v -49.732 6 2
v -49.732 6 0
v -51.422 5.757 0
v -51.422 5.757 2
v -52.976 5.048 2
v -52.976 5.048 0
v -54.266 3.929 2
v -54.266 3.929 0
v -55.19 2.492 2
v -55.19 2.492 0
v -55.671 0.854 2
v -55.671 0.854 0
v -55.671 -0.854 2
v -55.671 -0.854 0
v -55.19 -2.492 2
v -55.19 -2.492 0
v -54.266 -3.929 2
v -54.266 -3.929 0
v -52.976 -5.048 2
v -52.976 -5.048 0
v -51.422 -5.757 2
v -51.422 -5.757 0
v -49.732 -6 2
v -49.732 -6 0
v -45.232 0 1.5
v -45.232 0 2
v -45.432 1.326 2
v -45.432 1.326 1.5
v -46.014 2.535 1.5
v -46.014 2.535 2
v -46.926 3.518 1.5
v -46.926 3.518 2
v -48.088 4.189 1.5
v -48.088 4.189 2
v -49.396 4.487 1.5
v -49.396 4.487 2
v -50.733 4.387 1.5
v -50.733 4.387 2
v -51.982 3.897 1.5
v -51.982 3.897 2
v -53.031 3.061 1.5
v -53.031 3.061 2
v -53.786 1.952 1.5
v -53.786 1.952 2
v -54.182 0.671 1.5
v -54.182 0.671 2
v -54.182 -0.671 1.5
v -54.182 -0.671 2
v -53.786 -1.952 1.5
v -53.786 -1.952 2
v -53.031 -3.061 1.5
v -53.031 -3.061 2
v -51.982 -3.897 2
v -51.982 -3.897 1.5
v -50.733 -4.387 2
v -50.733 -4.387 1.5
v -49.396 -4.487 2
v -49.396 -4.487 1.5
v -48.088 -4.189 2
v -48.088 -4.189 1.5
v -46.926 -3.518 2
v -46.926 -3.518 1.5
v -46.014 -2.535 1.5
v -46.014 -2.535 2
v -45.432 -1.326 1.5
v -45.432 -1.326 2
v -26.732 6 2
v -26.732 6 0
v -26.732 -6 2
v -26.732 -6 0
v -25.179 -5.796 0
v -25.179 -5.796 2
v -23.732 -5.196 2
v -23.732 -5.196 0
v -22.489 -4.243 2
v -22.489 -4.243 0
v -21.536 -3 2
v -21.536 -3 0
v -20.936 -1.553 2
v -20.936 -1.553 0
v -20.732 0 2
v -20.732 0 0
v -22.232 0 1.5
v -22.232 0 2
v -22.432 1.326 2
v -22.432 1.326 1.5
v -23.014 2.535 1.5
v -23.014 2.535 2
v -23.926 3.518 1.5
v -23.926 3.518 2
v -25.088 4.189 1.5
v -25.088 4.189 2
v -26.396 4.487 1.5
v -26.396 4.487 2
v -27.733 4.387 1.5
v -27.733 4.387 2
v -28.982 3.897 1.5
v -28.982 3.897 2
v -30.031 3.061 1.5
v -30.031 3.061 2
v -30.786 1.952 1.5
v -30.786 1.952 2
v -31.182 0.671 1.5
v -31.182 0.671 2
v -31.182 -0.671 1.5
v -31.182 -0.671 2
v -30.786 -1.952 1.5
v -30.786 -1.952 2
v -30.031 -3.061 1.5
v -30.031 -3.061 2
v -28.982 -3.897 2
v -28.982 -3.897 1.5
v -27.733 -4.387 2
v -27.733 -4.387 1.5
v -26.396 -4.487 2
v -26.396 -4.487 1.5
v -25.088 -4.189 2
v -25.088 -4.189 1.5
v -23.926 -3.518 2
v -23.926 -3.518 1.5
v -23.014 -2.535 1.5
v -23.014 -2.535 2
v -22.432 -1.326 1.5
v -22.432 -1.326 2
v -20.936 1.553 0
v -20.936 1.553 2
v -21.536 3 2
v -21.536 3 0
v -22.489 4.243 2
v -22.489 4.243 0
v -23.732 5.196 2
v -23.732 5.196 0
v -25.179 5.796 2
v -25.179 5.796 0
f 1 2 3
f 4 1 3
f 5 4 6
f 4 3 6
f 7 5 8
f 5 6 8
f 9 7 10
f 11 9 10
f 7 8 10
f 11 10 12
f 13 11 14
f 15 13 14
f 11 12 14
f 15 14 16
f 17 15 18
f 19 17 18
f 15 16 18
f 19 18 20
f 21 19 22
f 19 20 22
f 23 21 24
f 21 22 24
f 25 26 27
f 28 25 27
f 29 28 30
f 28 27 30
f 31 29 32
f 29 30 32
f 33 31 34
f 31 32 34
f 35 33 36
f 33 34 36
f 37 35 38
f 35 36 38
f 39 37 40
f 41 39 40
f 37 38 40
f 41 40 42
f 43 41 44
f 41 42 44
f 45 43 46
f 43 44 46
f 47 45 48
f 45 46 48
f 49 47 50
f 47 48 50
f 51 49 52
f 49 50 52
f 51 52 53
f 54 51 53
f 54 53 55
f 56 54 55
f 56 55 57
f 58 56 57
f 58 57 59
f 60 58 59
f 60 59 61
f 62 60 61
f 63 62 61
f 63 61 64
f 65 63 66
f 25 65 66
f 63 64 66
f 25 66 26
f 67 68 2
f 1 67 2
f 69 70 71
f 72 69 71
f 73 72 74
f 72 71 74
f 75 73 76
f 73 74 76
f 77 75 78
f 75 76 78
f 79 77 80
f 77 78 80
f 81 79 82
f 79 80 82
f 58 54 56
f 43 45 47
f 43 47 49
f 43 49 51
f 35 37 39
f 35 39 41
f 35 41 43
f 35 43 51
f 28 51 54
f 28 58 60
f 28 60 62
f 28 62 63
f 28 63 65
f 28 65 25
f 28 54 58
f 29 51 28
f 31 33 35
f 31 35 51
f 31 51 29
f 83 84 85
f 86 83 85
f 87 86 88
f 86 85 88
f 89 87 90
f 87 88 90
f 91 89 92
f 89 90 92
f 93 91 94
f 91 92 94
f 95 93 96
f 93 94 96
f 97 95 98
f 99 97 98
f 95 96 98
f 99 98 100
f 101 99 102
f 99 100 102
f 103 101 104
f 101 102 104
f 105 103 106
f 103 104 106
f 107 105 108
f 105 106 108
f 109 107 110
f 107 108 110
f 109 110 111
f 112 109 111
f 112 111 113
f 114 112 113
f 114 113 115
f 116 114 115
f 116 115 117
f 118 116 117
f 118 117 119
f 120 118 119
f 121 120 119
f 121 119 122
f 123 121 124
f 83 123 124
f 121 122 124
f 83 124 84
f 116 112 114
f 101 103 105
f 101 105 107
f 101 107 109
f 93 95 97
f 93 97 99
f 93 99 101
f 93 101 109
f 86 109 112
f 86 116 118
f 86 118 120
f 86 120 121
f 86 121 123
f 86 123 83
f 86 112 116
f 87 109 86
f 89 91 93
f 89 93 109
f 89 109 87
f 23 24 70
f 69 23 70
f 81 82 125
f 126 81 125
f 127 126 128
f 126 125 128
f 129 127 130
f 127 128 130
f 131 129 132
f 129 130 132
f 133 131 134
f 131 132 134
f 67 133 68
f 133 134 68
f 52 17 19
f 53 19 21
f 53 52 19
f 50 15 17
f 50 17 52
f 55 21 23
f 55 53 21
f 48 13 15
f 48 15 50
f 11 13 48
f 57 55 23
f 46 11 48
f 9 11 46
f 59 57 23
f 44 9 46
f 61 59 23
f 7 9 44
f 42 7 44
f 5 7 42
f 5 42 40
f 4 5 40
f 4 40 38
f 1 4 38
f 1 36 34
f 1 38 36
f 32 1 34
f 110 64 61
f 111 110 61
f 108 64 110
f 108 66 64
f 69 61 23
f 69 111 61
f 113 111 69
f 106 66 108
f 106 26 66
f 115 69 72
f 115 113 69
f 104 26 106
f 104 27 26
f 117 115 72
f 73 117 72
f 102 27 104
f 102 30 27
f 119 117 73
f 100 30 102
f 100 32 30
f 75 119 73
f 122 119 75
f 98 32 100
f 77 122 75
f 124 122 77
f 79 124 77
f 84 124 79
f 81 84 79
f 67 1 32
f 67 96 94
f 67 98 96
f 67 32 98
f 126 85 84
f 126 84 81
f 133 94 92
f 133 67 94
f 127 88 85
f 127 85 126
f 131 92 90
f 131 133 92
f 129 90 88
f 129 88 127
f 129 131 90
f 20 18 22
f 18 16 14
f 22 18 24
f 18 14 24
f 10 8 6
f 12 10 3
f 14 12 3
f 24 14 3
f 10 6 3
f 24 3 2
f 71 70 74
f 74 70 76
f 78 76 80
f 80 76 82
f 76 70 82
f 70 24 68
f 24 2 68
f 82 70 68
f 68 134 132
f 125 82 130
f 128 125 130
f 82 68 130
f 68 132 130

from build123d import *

# Parameters (mm, degrees)
F1_DEPTH = 2
F2_R     = 4.5
F3_DEPTH = 0.5


with BuildPart() as f1:
    # F0 (on Top) → F1 (new body)
    with BuildSketch(Plane.XY):
        with BuildLine():
            ThreePointArc((-49.731933, -6), (-45.489292, -4.242641), (-43.731933, 0))
            ThreePointArc((-43.731933, 0), (-45.489292, 4.242641), (-49.731933, 6))
            ThreePointArc((-49.731933, 6), (-55.731933, 0), (-49.731933, -6))
        make_face()
        with BuildLine():
            ThreePointArc((-49.731933, 6), (-45.489292, 4.242641), (-43.731933, 0))
            ThreePointArc((-43.731933, 0), (-45.489292, -4.242641), (-49.731933, -6))
            Line((-49.731933, -6), (-26.731933, -6))
            ThreePointArc((-26.731933, -6), (-32.731933, 0), (-26.731933, 6))
            Line((-26.731933, 6), (-49.731933, 6))
        make_face()
        with BuildLine():
            ThreePointArc((-20.731933, 0), (-22.489292, 4.242641), (-26.731933, 6))
            ThreePointArc((-26.731933, 6), (-32.731933, 0), (-26.731933, -6))
            ThreePointArc((-26.731933, -6), (-22.489292, -4.242641), (-20.731933, 0))
        make_face()
    extrude(amount=F1_DEPTH)

    # F2 (on face) → F3 (cut)
    with BuildSketch(Plane.XY.offset(2)):
        with Locations((-49.731933, 0)):
            Circle(F2_R)
        with Locations((-26.731933, 0)):
            Circle(F2_R)
    extrude(amount=-F3_DEPTH, mode=Mode.SUBTRACT)


solid = f1.part
